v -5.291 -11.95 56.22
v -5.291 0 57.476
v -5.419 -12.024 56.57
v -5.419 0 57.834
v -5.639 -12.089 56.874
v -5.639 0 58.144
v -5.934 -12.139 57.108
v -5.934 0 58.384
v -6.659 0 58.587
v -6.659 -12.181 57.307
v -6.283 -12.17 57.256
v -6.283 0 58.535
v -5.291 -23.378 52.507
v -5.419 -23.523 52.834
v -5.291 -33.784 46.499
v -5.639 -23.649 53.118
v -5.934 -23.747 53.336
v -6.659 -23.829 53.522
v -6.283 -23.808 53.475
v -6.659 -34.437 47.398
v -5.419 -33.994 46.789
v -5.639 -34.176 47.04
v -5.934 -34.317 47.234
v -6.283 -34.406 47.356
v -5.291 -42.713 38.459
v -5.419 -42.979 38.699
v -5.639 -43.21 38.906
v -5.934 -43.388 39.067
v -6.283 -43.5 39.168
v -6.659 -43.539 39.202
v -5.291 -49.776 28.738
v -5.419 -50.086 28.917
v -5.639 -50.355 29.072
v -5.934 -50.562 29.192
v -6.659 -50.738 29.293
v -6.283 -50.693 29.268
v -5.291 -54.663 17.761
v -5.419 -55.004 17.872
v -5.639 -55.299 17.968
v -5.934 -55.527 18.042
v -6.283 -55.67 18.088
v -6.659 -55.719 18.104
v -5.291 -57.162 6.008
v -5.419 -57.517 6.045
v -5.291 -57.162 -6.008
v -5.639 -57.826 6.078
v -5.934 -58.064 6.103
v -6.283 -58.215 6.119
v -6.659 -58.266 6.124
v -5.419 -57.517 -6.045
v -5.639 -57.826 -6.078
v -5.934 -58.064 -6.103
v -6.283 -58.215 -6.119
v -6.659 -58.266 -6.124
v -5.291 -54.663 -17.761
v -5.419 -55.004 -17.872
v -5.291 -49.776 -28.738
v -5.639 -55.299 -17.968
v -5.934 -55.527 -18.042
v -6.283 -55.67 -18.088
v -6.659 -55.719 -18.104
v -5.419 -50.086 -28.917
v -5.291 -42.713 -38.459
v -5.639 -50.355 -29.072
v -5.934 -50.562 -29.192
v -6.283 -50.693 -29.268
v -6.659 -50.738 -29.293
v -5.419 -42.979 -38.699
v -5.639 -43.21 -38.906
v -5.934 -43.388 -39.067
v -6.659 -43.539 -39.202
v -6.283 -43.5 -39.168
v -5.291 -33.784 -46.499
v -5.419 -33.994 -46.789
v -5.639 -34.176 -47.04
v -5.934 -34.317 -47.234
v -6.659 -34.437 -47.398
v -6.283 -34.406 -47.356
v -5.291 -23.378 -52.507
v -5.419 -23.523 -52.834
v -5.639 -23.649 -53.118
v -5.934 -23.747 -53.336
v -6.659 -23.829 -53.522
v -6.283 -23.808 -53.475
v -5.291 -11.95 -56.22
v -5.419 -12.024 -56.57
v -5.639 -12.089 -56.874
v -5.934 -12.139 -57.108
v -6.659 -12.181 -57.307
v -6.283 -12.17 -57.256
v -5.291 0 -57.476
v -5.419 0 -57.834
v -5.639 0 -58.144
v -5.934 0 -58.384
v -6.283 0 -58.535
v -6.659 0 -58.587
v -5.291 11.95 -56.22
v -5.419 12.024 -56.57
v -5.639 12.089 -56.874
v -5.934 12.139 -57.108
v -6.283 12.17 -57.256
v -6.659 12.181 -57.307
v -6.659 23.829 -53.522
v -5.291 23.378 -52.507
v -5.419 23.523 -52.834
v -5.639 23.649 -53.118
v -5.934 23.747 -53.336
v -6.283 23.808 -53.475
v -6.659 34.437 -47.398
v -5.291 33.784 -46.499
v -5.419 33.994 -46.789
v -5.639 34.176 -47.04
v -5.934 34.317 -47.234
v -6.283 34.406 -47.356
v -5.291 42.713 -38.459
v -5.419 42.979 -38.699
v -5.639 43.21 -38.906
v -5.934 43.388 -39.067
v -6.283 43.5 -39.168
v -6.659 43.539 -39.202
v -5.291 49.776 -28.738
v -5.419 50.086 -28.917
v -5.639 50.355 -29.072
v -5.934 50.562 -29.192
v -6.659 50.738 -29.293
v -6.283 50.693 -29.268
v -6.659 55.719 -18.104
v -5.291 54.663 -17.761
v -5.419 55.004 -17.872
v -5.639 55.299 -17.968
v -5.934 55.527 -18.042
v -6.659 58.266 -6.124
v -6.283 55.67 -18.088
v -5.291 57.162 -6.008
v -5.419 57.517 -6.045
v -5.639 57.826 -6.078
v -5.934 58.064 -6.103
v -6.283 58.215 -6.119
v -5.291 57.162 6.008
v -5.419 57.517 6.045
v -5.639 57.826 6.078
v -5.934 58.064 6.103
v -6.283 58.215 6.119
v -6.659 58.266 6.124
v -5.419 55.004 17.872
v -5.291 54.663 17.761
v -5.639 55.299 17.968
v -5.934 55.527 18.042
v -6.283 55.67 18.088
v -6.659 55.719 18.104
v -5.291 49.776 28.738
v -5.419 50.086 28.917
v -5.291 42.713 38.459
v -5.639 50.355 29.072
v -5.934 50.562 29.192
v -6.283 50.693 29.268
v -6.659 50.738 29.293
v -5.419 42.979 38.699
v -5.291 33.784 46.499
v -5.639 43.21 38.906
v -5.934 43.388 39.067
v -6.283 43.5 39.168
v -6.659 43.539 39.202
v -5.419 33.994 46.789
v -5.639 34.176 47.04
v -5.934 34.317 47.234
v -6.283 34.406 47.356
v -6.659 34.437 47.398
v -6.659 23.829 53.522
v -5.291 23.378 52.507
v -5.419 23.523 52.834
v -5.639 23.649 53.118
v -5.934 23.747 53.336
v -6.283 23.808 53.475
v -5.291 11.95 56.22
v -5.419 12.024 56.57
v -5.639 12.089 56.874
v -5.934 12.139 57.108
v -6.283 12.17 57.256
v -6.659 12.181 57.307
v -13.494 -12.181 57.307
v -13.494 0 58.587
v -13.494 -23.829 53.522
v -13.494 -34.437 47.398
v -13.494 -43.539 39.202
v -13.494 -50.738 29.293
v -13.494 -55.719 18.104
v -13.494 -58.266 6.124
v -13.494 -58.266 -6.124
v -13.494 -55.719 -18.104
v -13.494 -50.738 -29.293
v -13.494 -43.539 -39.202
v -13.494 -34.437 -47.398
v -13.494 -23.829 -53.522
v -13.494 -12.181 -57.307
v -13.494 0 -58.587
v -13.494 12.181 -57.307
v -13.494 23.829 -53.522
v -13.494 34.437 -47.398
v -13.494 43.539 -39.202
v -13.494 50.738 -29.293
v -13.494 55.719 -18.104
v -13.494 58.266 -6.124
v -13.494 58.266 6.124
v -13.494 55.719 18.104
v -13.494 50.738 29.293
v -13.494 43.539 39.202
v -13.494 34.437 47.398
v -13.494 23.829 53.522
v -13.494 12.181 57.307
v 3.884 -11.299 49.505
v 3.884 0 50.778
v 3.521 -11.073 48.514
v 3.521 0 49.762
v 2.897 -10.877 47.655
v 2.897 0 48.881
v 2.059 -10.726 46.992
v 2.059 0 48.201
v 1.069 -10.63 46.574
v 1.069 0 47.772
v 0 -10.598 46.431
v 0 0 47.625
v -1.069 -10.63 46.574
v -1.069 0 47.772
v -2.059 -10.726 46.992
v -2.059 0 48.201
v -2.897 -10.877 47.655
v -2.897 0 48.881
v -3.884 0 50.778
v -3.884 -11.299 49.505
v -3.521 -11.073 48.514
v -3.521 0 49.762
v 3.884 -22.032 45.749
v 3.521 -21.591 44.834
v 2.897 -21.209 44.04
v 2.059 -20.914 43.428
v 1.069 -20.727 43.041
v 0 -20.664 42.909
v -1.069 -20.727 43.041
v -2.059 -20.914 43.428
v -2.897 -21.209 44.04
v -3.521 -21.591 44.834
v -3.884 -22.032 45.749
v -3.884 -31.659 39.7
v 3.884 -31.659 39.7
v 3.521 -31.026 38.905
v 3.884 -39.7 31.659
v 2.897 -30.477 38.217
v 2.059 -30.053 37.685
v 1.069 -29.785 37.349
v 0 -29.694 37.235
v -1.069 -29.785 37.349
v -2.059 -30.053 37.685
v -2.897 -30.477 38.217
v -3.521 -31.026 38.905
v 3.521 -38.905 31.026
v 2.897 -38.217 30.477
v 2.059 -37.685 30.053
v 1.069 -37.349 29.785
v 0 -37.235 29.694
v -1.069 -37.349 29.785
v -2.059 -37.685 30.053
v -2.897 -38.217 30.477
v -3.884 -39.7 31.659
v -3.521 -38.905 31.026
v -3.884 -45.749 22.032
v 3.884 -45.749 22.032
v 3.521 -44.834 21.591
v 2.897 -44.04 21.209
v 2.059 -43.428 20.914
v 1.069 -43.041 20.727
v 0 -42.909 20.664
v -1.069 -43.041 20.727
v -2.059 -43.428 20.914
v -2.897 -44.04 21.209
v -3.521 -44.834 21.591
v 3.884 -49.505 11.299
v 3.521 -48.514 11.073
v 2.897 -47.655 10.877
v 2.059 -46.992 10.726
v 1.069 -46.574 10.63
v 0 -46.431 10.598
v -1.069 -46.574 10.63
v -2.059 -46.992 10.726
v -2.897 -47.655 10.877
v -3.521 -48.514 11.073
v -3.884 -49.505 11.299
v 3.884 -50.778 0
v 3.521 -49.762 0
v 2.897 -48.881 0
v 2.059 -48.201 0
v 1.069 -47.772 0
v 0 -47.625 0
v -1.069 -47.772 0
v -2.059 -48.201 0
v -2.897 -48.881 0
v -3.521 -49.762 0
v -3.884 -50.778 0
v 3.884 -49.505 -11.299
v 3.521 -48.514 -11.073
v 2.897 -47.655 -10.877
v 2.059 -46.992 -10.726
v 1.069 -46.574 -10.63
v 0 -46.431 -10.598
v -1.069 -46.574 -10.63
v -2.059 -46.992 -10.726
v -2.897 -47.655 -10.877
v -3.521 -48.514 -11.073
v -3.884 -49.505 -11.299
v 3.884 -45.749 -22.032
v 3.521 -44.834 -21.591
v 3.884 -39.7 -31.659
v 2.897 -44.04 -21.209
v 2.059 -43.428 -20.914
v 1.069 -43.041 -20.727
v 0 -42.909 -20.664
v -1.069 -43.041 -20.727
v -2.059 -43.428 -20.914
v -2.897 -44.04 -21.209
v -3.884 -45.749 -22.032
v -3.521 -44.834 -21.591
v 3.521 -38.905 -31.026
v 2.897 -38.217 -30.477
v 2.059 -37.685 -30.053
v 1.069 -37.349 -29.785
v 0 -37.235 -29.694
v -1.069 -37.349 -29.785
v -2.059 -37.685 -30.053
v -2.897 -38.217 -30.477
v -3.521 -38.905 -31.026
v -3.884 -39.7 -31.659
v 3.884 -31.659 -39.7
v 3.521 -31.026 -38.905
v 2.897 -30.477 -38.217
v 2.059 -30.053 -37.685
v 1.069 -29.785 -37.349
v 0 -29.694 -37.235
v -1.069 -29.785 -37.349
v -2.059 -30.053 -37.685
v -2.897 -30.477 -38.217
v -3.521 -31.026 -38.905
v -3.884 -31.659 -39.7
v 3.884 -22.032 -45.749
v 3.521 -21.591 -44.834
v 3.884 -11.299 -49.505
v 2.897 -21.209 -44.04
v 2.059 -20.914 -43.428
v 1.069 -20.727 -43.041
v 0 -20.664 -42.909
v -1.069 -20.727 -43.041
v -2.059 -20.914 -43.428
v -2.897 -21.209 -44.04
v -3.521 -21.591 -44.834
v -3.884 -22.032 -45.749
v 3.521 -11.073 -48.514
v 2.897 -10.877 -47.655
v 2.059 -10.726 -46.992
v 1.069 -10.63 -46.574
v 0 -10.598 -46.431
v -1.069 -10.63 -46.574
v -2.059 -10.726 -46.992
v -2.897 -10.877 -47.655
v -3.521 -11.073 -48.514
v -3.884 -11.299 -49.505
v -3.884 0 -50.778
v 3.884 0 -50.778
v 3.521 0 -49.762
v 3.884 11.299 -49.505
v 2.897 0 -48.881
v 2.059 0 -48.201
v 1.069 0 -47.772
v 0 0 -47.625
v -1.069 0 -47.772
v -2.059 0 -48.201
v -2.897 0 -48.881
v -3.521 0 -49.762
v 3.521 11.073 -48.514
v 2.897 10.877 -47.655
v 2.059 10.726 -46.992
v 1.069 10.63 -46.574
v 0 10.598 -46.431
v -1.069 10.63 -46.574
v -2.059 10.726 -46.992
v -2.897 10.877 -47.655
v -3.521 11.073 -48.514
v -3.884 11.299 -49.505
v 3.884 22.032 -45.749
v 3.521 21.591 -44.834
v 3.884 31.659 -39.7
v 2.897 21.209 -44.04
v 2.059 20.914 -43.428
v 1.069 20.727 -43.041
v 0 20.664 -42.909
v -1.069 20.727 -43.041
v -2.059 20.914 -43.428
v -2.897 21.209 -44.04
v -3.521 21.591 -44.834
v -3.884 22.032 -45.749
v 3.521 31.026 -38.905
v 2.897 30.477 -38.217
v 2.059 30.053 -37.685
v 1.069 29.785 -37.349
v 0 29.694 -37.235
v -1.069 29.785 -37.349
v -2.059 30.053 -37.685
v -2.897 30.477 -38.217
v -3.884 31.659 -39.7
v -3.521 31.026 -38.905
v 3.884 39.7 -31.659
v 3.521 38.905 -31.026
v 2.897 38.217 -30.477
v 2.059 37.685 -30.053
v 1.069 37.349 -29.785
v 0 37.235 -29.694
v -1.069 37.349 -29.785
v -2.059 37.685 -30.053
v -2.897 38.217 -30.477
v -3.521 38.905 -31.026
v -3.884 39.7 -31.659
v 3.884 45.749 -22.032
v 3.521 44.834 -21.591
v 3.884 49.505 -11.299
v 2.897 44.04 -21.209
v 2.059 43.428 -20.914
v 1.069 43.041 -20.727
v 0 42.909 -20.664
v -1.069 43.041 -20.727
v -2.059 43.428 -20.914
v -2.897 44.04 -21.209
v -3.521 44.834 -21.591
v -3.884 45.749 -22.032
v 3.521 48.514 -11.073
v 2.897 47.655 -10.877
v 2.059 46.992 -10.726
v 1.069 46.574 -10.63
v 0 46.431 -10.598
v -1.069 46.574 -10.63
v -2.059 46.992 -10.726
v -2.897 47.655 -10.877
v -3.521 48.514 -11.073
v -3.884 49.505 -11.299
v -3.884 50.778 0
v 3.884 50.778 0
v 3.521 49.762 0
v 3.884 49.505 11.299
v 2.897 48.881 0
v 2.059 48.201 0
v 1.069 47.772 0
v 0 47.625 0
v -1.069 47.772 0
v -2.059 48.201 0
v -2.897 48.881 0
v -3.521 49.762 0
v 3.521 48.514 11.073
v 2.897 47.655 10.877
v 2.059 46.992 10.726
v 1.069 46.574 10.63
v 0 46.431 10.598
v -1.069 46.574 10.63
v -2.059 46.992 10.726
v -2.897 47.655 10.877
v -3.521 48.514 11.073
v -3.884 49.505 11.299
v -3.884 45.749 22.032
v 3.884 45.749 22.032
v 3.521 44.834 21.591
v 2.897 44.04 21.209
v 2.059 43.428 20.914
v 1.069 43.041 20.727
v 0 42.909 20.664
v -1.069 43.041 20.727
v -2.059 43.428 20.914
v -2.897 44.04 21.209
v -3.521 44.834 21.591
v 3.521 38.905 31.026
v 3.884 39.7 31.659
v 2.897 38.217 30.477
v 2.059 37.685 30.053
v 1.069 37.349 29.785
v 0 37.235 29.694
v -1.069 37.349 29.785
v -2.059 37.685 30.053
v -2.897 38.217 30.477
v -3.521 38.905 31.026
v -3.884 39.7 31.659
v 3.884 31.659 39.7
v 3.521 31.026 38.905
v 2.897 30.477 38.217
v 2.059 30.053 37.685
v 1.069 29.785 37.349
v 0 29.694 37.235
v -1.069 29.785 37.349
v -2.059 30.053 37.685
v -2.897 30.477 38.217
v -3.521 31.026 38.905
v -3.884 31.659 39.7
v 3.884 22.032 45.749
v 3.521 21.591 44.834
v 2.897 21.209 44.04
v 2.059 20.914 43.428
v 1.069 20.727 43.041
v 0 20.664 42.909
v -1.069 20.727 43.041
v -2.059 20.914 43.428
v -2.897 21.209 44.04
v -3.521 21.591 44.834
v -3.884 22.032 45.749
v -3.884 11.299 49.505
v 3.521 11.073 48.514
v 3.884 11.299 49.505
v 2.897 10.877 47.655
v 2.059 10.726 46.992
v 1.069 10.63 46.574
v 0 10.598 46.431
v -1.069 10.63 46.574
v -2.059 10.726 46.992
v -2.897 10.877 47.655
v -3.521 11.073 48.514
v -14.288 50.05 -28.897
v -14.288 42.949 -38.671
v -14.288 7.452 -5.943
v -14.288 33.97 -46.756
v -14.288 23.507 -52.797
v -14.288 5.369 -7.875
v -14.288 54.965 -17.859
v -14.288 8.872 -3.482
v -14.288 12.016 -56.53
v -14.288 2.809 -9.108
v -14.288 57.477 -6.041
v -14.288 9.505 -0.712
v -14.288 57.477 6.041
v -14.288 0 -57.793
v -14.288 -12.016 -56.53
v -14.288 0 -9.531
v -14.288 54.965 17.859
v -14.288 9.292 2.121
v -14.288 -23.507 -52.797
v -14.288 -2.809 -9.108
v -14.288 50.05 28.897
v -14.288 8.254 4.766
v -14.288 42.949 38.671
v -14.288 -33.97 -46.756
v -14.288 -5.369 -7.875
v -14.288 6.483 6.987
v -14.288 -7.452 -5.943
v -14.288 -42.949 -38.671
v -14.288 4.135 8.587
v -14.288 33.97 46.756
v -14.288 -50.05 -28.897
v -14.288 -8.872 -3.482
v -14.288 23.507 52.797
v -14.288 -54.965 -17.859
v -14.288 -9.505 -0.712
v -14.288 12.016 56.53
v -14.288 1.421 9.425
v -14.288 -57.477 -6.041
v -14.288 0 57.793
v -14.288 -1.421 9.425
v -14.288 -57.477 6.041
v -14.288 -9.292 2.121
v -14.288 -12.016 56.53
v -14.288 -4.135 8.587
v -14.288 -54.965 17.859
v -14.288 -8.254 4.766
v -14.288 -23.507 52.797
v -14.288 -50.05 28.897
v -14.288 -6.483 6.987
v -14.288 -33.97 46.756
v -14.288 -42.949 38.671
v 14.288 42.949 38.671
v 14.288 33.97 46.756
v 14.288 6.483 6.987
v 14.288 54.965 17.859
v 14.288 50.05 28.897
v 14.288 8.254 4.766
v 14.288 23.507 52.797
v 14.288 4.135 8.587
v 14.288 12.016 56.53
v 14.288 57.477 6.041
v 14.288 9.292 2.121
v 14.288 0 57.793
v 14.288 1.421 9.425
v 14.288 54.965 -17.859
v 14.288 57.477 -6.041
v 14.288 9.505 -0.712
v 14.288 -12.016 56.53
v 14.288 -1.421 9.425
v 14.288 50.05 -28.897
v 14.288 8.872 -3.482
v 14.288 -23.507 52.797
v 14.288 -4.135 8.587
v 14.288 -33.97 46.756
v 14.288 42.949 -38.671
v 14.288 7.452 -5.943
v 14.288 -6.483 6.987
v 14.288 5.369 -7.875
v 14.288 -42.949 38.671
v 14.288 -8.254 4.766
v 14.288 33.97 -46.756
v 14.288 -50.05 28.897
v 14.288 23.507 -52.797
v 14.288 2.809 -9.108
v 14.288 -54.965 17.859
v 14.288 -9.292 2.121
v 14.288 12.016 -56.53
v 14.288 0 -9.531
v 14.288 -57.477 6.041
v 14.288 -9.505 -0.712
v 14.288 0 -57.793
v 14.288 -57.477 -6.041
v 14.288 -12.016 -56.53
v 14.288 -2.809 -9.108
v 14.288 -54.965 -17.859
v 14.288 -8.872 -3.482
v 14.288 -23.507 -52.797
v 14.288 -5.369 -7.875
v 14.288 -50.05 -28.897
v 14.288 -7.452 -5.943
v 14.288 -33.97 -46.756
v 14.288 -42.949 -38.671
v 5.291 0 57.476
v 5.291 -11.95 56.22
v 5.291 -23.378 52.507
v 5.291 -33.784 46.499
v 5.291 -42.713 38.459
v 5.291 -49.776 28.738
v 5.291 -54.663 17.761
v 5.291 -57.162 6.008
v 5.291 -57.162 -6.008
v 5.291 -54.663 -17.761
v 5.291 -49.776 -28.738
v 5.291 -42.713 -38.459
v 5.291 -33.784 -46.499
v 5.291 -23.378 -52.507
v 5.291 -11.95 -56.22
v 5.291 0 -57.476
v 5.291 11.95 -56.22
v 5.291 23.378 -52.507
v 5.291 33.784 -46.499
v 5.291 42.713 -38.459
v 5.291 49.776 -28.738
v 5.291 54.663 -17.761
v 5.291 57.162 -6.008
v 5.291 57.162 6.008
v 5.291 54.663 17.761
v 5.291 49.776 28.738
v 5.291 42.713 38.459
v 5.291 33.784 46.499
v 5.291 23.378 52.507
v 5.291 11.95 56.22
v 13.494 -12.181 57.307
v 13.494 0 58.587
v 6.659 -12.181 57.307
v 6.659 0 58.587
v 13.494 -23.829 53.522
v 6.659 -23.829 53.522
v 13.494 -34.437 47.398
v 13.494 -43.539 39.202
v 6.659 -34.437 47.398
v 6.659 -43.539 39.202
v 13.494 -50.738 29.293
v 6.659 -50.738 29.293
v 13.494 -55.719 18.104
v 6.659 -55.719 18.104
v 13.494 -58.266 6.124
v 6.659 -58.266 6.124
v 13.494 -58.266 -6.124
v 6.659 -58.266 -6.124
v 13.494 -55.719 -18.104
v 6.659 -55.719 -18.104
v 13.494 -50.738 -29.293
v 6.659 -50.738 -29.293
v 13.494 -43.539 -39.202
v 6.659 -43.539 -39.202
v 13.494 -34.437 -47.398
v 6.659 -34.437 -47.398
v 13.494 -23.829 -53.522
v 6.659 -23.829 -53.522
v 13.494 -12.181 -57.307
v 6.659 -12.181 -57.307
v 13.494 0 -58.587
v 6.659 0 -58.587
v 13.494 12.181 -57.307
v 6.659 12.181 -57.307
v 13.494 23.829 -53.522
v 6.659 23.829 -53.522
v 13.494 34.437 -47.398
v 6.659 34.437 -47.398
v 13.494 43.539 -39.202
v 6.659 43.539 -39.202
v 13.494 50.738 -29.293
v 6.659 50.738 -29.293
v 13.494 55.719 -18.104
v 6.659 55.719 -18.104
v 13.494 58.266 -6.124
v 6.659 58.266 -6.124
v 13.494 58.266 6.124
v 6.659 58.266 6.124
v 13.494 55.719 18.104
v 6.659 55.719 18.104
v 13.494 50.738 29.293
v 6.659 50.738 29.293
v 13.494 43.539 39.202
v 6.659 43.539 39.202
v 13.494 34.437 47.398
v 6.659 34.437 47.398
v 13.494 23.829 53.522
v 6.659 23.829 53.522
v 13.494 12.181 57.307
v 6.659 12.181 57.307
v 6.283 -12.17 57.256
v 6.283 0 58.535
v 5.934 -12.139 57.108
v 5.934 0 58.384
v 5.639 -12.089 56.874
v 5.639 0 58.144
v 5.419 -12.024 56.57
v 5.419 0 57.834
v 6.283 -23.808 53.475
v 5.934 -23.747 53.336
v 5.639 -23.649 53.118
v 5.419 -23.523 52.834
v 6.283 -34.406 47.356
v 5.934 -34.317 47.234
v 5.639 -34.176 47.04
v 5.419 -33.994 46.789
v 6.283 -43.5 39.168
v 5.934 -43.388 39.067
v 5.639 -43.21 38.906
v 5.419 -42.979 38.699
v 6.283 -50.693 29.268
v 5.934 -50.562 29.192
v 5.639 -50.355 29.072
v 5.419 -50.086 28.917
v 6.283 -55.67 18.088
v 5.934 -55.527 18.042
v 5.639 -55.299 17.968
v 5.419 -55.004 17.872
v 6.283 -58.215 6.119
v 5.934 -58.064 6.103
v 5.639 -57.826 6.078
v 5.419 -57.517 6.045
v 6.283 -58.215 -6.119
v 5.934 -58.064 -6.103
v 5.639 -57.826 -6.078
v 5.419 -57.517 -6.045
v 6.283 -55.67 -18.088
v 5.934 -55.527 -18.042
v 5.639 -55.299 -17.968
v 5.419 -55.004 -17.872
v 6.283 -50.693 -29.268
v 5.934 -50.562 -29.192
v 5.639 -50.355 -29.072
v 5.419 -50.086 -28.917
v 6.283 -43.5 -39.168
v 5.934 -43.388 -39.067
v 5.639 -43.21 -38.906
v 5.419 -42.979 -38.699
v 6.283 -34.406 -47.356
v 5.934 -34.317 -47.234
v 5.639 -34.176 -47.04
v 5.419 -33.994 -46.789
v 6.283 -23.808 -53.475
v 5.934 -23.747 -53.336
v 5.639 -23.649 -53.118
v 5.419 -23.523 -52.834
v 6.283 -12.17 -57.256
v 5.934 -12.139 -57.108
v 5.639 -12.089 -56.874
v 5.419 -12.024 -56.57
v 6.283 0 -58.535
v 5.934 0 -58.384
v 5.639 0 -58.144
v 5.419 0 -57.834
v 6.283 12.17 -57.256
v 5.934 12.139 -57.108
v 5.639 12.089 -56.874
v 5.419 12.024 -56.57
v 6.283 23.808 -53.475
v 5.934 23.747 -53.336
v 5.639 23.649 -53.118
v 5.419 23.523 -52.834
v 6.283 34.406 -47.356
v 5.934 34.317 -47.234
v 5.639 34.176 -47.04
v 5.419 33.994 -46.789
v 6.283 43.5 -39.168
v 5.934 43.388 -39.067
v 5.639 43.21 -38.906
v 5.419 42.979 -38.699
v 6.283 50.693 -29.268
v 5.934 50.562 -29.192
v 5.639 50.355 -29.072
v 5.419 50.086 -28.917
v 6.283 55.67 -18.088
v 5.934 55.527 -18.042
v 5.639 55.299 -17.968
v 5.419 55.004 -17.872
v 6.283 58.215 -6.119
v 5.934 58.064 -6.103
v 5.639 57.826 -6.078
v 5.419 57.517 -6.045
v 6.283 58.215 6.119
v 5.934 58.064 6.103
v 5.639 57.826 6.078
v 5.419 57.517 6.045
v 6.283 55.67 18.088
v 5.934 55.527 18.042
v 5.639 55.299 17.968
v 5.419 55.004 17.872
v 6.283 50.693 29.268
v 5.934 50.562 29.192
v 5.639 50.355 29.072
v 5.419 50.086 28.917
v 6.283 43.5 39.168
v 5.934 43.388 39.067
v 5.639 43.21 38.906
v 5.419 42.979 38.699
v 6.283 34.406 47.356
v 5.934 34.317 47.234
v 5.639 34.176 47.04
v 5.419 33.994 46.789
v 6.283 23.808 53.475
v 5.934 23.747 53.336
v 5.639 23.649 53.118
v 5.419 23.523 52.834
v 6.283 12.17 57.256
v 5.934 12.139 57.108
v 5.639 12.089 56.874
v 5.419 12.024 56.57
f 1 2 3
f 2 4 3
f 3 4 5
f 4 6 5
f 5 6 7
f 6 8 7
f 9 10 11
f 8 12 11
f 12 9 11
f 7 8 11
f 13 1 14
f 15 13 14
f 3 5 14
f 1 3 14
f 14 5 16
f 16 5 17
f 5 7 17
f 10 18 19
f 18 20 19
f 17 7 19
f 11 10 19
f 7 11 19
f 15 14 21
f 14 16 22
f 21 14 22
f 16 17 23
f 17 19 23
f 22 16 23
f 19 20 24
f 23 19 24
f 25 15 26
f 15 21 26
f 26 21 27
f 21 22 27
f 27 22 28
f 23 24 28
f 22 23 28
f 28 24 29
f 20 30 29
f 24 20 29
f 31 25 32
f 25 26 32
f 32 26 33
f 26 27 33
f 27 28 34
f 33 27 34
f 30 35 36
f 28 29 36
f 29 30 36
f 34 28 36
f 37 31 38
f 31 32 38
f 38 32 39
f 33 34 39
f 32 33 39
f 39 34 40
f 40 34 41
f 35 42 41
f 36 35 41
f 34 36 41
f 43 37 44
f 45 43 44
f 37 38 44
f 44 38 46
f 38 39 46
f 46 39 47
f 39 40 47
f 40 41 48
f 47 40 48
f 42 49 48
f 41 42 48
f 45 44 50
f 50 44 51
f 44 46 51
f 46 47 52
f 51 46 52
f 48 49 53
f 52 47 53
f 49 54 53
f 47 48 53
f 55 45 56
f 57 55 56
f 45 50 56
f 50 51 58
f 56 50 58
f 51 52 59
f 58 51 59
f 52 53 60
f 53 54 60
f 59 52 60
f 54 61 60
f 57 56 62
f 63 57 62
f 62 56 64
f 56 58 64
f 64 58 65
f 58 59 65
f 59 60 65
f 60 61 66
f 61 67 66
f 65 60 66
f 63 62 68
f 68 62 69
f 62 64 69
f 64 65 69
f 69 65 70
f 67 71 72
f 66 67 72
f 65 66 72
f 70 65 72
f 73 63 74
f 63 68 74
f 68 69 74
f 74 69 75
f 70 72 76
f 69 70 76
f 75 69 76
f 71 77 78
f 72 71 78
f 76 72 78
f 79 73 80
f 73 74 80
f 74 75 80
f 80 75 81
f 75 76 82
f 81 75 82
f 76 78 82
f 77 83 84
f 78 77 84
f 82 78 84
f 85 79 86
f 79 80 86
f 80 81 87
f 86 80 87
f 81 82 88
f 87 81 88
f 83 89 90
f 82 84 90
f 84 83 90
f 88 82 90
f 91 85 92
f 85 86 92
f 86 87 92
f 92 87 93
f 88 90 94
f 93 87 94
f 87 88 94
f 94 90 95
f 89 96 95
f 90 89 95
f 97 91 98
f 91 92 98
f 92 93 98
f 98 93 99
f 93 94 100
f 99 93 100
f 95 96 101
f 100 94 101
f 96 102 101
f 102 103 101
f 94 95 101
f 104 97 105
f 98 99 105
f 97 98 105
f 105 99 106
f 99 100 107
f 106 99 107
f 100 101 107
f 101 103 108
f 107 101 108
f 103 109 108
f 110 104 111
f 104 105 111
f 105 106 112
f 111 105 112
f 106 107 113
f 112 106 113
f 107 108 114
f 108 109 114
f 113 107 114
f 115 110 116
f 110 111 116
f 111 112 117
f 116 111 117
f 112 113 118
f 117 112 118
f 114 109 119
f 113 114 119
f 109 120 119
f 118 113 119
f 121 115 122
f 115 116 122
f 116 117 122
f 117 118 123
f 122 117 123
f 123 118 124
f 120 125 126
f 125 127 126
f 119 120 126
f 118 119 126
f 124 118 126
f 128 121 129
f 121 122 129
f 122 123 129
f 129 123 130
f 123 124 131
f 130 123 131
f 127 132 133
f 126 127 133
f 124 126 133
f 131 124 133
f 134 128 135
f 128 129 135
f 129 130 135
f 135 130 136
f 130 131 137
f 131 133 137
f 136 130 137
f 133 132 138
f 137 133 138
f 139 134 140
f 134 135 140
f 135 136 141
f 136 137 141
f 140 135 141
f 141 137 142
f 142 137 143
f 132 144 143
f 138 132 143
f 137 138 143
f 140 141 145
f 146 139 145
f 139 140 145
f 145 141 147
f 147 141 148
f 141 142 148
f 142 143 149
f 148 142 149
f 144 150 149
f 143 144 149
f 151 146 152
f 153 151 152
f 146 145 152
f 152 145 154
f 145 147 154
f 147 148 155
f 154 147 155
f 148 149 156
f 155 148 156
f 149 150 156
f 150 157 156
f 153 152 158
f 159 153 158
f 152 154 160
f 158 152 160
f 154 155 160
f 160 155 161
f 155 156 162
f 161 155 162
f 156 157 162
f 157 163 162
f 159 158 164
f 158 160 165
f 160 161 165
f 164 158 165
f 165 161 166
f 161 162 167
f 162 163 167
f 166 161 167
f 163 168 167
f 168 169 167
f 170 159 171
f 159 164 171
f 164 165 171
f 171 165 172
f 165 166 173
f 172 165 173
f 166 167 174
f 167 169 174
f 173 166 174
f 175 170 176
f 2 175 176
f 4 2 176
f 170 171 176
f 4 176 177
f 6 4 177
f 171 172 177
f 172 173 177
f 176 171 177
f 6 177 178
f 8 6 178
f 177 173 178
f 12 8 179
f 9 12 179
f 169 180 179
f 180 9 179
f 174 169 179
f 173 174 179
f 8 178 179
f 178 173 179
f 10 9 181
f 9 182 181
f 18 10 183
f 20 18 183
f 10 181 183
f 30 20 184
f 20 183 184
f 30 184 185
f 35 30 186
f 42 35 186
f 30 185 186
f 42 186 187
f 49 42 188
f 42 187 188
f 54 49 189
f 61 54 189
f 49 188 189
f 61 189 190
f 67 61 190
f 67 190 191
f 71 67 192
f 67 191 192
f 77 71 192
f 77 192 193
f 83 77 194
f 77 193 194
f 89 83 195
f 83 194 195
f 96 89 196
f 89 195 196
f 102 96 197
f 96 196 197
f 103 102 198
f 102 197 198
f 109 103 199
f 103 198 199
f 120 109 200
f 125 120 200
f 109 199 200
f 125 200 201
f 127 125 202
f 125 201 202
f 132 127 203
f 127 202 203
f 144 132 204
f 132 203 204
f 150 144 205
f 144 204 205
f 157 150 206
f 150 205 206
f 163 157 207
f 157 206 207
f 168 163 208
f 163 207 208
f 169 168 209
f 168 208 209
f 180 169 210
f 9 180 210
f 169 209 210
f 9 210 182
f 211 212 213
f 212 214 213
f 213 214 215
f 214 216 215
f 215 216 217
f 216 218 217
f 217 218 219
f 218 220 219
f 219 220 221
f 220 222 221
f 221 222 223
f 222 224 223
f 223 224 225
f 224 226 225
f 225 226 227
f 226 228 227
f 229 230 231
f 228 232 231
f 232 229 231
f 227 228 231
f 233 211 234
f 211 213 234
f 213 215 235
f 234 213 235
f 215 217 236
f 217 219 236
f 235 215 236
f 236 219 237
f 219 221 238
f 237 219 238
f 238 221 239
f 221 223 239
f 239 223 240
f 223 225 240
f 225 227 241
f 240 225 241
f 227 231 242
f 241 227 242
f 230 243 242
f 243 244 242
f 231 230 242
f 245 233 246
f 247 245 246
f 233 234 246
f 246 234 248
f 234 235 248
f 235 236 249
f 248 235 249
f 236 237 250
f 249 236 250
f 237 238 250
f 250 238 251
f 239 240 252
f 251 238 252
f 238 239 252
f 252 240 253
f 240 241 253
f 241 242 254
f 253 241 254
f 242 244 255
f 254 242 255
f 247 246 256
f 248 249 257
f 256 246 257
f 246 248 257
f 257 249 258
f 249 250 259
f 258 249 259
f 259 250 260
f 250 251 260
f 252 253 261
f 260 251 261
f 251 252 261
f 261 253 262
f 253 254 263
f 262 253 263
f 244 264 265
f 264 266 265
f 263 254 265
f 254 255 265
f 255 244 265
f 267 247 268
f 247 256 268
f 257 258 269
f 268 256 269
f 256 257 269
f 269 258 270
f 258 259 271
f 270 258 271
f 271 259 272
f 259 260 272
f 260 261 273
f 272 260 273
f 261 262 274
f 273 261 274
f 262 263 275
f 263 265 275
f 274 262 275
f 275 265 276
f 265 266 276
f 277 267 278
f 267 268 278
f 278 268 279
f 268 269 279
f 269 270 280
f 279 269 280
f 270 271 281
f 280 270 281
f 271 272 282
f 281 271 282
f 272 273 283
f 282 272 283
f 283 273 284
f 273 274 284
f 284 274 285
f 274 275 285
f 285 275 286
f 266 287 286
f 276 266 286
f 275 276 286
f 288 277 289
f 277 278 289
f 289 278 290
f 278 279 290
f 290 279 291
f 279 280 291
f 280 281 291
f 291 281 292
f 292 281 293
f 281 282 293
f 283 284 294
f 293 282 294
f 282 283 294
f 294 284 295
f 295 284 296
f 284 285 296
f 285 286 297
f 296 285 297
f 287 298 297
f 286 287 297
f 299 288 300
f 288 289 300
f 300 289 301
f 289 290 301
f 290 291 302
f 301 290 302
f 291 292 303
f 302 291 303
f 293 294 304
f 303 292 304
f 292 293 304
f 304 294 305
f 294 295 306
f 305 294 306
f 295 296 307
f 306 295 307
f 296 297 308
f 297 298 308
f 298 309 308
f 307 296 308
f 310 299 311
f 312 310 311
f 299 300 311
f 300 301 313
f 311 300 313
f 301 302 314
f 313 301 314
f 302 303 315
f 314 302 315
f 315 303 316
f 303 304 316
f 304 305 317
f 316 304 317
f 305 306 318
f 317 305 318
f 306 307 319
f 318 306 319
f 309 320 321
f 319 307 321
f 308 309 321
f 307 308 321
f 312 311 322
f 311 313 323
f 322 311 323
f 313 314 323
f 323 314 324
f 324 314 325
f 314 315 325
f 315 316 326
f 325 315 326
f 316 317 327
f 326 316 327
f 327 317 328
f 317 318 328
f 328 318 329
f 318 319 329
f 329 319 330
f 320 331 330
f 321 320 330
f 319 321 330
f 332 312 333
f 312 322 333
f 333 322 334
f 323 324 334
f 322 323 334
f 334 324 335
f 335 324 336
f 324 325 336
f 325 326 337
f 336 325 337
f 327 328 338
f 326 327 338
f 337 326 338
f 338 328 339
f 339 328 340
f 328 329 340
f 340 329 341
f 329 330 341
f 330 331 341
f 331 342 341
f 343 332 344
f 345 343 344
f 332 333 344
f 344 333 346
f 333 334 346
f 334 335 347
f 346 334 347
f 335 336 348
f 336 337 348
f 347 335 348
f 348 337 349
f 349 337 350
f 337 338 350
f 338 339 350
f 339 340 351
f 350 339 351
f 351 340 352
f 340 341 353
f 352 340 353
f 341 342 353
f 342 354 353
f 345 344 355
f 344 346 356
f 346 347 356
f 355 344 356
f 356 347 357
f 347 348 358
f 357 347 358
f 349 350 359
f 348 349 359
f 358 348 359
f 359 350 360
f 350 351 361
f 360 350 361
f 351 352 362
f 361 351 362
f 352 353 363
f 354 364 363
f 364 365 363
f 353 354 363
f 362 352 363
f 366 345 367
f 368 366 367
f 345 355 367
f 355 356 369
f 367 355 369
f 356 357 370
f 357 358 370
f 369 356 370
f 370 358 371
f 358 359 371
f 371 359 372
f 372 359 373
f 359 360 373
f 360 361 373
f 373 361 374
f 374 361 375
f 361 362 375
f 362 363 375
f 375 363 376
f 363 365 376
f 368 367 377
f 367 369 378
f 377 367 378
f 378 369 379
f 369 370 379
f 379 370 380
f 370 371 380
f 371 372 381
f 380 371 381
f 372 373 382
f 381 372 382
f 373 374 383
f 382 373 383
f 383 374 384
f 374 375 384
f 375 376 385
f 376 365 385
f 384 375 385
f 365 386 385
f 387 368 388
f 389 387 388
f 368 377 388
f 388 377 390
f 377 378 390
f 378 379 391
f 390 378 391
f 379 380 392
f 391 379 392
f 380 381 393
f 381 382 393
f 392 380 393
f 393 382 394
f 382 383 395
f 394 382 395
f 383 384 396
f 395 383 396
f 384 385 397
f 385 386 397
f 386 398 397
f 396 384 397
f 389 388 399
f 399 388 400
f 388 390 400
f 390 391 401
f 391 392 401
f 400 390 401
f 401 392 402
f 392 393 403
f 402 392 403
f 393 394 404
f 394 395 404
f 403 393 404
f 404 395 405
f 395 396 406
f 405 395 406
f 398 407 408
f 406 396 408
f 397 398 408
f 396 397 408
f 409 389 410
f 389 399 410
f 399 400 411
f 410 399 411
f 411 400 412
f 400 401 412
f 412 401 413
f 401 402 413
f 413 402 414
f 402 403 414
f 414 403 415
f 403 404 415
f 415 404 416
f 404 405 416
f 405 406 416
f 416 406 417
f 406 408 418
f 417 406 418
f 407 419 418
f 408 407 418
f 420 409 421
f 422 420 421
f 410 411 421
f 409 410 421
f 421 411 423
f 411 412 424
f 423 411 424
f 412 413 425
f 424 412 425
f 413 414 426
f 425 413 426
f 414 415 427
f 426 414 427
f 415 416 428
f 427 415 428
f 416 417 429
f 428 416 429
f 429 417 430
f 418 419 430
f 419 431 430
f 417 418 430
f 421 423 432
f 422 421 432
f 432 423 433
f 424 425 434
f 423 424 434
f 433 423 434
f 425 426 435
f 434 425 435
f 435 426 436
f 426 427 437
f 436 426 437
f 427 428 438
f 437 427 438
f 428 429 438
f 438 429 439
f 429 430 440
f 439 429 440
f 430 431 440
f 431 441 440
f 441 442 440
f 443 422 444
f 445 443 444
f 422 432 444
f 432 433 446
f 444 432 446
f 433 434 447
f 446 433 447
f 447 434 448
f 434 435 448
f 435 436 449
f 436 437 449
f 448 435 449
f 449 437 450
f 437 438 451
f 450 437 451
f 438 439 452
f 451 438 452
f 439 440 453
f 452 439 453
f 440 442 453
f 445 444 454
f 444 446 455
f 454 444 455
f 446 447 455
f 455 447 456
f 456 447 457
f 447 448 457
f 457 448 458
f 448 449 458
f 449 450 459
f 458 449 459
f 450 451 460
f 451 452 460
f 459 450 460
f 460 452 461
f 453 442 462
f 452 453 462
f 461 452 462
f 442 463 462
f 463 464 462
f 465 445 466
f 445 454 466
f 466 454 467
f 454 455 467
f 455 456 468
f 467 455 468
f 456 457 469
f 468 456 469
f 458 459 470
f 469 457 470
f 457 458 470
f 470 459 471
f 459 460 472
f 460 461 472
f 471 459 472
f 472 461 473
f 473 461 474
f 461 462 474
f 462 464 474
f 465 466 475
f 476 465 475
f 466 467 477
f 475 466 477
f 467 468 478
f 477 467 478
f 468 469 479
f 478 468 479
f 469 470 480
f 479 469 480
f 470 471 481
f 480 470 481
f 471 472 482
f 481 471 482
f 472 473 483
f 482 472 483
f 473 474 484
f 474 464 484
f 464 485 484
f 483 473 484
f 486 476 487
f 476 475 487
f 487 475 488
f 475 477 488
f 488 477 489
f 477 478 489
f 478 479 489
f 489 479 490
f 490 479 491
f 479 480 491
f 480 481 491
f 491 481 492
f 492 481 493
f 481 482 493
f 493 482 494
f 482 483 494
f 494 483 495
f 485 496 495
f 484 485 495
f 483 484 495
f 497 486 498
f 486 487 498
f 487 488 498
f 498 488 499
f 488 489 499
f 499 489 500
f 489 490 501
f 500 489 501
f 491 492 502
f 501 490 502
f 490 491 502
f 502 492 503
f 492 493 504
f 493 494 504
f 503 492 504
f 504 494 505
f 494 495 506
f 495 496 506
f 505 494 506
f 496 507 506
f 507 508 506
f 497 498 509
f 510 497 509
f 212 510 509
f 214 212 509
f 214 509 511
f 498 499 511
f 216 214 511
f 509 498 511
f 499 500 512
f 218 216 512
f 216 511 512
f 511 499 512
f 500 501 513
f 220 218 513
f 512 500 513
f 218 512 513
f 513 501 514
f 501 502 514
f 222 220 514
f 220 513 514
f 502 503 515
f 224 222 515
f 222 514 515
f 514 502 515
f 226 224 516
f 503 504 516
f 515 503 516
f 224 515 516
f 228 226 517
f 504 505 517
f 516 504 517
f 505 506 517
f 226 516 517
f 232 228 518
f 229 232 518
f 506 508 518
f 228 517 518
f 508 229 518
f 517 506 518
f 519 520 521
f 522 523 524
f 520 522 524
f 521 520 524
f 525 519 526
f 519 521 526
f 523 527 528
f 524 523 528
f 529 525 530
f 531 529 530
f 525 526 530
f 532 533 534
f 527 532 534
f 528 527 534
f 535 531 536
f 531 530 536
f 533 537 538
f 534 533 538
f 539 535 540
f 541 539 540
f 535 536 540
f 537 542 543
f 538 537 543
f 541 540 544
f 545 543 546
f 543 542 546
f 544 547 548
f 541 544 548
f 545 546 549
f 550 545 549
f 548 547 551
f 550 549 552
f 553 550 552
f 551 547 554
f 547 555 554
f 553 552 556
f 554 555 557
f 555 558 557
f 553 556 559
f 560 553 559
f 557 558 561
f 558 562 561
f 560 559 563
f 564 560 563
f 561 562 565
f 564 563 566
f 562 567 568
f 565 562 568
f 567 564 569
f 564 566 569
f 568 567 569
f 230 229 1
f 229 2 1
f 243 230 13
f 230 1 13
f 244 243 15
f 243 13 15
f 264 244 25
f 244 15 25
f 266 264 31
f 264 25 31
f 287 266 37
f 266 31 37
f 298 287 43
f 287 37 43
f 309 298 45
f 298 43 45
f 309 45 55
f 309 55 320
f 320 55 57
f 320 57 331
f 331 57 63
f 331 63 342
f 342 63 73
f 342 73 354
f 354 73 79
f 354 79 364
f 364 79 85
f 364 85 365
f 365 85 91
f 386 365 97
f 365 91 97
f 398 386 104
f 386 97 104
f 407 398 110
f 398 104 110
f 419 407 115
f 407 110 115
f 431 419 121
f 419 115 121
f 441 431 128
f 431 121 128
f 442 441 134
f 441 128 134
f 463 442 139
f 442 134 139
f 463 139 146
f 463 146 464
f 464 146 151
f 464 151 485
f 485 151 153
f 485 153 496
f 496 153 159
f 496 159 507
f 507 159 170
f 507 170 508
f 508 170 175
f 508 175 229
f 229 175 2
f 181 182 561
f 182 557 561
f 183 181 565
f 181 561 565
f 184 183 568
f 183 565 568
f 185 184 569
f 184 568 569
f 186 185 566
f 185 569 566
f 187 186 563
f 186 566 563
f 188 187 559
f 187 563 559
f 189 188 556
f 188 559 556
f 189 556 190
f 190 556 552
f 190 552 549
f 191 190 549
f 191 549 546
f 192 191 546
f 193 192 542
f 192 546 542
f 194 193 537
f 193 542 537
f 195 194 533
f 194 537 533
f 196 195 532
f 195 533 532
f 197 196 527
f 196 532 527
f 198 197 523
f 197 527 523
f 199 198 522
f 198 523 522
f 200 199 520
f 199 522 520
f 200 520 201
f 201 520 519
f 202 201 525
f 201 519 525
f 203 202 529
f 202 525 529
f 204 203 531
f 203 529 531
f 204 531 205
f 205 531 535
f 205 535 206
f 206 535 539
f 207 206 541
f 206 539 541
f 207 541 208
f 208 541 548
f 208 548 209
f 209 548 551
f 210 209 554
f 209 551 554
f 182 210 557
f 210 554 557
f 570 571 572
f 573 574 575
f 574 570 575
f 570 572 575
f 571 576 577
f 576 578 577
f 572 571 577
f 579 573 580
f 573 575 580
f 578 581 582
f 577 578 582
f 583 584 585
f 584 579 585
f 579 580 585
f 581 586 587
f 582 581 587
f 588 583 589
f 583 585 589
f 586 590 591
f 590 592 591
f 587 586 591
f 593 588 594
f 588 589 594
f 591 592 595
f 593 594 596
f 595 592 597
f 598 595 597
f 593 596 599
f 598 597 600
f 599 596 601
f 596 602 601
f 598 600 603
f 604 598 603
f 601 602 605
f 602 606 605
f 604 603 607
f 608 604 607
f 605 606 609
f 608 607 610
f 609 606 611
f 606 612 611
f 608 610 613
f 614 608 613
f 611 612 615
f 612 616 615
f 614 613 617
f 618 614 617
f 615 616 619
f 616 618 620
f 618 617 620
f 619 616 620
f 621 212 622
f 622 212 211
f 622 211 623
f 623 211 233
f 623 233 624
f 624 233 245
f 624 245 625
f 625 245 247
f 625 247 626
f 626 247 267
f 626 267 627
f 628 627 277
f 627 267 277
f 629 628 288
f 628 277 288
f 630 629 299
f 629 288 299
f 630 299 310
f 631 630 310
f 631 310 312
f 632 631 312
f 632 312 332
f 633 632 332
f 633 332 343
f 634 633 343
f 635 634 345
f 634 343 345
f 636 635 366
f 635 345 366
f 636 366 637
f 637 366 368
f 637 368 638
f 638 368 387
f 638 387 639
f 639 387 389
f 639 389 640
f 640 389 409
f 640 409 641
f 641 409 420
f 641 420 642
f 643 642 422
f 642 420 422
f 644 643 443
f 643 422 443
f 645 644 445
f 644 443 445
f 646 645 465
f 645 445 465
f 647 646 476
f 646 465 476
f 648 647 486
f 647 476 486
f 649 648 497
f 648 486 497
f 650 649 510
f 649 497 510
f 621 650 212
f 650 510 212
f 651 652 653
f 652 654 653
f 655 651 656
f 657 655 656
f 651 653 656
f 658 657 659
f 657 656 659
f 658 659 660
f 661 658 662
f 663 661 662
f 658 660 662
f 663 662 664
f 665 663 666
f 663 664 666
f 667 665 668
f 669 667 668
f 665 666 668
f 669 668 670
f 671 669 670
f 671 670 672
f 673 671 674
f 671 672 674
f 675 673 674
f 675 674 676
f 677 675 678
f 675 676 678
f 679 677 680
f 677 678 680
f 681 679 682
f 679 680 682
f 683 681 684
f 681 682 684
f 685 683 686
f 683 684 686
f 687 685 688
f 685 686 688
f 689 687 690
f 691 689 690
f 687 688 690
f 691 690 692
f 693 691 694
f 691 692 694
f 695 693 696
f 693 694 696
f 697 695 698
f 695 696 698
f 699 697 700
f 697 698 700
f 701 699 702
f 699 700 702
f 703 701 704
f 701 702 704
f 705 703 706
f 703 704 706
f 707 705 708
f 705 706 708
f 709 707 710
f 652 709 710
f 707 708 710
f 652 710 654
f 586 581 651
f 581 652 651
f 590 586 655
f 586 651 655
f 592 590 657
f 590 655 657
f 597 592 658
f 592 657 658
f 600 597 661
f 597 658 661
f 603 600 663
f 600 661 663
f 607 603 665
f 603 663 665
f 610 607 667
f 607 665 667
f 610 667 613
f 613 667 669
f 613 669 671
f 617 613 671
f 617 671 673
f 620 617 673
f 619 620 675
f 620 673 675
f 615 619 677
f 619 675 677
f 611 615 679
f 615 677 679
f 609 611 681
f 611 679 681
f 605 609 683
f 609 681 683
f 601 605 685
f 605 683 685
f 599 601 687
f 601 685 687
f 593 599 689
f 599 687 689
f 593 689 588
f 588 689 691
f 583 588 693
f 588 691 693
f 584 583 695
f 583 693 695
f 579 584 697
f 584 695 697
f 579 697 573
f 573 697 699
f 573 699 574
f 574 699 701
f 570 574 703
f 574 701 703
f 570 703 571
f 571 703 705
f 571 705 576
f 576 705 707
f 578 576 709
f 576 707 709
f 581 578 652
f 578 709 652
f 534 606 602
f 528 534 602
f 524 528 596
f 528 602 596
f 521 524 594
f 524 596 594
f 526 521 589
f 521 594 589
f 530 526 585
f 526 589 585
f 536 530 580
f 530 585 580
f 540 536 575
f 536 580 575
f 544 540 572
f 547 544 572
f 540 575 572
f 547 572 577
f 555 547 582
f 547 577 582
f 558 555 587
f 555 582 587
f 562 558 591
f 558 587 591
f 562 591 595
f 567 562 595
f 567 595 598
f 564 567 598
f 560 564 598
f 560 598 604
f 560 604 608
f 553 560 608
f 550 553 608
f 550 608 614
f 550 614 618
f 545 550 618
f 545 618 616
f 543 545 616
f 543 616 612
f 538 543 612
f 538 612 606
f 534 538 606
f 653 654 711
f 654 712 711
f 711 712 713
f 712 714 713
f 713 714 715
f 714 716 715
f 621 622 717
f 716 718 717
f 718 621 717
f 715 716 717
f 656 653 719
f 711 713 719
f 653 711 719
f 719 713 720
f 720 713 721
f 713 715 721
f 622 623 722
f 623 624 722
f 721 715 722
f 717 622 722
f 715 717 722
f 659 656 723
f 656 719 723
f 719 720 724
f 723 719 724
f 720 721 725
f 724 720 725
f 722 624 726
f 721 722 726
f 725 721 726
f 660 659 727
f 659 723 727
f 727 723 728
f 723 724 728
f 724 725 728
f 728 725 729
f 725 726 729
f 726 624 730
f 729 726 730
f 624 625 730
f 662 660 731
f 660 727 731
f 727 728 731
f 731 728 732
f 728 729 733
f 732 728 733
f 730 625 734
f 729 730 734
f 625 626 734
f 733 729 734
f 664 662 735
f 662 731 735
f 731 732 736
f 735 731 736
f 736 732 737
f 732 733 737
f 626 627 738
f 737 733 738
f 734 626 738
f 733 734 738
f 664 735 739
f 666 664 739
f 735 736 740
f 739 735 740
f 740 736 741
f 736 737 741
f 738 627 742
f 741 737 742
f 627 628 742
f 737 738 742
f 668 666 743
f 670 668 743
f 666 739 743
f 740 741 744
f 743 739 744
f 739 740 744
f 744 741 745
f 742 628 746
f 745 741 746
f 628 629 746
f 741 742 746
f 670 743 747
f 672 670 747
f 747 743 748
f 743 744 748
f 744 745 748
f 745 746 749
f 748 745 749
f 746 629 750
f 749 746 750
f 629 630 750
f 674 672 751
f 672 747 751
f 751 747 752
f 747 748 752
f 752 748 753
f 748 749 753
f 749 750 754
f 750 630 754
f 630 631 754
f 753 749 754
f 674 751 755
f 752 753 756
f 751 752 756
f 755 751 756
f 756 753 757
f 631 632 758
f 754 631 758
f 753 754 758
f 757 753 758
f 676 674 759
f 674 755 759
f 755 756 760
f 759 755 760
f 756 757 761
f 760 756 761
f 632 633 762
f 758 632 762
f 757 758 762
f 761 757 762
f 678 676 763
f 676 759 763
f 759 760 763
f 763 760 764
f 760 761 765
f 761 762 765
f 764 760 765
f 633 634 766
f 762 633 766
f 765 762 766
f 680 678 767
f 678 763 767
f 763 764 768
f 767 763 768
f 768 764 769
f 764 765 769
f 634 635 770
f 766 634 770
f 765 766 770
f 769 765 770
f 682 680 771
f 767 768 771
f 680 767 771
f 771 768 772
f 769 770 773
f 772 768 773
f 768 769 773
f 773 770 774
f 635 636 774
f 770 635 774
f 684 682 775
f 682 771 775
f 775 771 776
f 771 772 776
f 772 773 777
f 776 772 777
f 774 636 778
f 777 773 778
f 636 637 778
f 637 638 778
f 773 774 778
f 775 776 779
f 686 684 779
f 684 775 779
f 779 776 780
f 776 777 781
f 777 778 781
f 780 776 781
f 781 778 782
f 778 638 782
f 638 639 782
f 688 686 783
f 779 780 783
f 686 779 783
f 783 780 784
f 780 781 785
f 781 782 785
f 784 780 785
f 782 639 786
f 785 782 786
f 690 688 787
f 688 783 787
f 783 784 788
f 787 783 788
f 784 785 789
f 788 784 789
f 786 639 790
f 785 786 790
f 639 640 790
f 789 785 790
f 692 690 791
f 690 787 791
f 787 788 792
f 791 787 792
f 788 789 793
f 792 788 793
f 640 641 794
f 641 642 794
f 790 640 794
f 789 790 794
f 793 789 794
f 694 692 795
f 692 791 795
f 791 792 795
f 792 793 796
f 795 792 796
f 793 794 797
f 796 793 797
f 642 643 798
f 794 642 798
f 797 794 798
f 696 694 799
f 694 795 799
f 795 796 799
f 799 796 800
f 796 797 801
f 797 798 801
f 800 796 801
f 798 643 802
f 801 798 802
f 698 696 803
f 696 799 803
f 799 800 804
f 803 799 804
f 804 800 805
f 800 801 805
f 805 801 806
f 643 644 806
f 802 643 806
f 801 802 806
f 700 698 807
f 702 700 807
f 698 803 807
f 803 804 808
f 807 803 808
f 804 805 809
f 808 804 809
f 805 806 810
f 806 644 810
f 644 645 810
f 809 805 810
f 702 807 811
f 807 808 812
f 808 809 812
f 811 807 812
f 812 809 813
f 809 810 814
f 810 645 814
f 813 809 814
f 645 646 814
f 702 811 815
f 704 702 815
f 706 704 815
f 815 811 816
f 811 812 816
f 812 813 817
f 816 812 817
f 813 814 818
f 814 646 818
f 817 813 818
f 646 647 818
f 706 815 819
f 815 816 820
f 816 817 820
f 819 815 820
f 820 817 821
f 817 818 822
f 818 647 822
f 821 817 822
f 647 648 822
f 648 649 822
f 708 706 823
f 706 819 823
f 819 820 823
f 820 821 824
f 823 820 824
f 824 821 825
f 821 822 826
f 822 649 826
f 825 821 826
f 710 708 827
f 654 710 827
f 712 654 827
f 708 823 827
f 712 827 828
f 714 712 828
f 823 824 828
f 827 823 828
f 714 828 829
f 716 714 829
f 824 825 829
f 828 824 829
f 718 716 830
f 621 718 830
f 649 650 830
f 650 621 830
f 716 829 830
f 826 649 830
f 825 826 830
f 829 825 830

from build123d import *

# Parameters (mm, degrees)
SKETCH2_R          = 9.53135
CUT_EXTRUDE1_DEPTH = 29.575


with BuildPart() as part:
    # Sketch1 → Revolve1 (revolve)
    with BuildSketch(Plane.XY, mode=Mode.PRIVATE) as revolve1_sk:
        with BuildLine():
            Line((-14.2875, 0), (14.2875, 0))
            Line((14.2875, 0), (14.2875, 57.793141026))
            Line((14.2875, 57.793141026), (13.49375, 58.586891026))
            Line((13.49375, 58.586891026), (6.659344616, 58.586891026))
            ThreePointArc((6.659344616, 58.586891026), (5.778331049, 58.274323253), (5.291300439, 57.476398003))
            Line((5.291300439, 57.476398003), (3.883957867, 50.777754993))
            ThreePointArc((3.883957867, 50.777754993), (0, 47.625), (-3.883957867, 50.777754993))
            Line((-3.883957867, 50.777754993), (-5.291300439, 57.476398003))
            ThreePointArc((-5.291300439, 57.476398003), (-5.778331049, 58.274323253), (-6.659344616, 58.586891026))
            Line((-6.659344616, 58.586891026), (-13.49375, 58.586891026))
            Line((-13.49375, 58.586891026), (-14.2875, 57.793141026))
            Line((-14.2875, 57.793141026), (-14.2875, 0))
        make_face()
    revolve(revolve1_sk.sketch.rotate(Axis((-14.2875, 0, 0), (1, 0, 0)), 90), axis=Axis((-14.2875, 0, 0), (1, 0, 0)))  # turned: the seam where the file's is

    # Sketch2 → Cut-Extrude1 (cut, through all)
    with BuildSketch(Plane(origin=(14.2875, 0, 0), x_dir=(0, 0, -1), z_dir=(1, 0, 0))):
        Circle(SKETCH2_R)
    extrude(amount=-CUT_EXTRUDE1_DEPTH, mode=Mode.SUBTRACT)


solid = part.part
